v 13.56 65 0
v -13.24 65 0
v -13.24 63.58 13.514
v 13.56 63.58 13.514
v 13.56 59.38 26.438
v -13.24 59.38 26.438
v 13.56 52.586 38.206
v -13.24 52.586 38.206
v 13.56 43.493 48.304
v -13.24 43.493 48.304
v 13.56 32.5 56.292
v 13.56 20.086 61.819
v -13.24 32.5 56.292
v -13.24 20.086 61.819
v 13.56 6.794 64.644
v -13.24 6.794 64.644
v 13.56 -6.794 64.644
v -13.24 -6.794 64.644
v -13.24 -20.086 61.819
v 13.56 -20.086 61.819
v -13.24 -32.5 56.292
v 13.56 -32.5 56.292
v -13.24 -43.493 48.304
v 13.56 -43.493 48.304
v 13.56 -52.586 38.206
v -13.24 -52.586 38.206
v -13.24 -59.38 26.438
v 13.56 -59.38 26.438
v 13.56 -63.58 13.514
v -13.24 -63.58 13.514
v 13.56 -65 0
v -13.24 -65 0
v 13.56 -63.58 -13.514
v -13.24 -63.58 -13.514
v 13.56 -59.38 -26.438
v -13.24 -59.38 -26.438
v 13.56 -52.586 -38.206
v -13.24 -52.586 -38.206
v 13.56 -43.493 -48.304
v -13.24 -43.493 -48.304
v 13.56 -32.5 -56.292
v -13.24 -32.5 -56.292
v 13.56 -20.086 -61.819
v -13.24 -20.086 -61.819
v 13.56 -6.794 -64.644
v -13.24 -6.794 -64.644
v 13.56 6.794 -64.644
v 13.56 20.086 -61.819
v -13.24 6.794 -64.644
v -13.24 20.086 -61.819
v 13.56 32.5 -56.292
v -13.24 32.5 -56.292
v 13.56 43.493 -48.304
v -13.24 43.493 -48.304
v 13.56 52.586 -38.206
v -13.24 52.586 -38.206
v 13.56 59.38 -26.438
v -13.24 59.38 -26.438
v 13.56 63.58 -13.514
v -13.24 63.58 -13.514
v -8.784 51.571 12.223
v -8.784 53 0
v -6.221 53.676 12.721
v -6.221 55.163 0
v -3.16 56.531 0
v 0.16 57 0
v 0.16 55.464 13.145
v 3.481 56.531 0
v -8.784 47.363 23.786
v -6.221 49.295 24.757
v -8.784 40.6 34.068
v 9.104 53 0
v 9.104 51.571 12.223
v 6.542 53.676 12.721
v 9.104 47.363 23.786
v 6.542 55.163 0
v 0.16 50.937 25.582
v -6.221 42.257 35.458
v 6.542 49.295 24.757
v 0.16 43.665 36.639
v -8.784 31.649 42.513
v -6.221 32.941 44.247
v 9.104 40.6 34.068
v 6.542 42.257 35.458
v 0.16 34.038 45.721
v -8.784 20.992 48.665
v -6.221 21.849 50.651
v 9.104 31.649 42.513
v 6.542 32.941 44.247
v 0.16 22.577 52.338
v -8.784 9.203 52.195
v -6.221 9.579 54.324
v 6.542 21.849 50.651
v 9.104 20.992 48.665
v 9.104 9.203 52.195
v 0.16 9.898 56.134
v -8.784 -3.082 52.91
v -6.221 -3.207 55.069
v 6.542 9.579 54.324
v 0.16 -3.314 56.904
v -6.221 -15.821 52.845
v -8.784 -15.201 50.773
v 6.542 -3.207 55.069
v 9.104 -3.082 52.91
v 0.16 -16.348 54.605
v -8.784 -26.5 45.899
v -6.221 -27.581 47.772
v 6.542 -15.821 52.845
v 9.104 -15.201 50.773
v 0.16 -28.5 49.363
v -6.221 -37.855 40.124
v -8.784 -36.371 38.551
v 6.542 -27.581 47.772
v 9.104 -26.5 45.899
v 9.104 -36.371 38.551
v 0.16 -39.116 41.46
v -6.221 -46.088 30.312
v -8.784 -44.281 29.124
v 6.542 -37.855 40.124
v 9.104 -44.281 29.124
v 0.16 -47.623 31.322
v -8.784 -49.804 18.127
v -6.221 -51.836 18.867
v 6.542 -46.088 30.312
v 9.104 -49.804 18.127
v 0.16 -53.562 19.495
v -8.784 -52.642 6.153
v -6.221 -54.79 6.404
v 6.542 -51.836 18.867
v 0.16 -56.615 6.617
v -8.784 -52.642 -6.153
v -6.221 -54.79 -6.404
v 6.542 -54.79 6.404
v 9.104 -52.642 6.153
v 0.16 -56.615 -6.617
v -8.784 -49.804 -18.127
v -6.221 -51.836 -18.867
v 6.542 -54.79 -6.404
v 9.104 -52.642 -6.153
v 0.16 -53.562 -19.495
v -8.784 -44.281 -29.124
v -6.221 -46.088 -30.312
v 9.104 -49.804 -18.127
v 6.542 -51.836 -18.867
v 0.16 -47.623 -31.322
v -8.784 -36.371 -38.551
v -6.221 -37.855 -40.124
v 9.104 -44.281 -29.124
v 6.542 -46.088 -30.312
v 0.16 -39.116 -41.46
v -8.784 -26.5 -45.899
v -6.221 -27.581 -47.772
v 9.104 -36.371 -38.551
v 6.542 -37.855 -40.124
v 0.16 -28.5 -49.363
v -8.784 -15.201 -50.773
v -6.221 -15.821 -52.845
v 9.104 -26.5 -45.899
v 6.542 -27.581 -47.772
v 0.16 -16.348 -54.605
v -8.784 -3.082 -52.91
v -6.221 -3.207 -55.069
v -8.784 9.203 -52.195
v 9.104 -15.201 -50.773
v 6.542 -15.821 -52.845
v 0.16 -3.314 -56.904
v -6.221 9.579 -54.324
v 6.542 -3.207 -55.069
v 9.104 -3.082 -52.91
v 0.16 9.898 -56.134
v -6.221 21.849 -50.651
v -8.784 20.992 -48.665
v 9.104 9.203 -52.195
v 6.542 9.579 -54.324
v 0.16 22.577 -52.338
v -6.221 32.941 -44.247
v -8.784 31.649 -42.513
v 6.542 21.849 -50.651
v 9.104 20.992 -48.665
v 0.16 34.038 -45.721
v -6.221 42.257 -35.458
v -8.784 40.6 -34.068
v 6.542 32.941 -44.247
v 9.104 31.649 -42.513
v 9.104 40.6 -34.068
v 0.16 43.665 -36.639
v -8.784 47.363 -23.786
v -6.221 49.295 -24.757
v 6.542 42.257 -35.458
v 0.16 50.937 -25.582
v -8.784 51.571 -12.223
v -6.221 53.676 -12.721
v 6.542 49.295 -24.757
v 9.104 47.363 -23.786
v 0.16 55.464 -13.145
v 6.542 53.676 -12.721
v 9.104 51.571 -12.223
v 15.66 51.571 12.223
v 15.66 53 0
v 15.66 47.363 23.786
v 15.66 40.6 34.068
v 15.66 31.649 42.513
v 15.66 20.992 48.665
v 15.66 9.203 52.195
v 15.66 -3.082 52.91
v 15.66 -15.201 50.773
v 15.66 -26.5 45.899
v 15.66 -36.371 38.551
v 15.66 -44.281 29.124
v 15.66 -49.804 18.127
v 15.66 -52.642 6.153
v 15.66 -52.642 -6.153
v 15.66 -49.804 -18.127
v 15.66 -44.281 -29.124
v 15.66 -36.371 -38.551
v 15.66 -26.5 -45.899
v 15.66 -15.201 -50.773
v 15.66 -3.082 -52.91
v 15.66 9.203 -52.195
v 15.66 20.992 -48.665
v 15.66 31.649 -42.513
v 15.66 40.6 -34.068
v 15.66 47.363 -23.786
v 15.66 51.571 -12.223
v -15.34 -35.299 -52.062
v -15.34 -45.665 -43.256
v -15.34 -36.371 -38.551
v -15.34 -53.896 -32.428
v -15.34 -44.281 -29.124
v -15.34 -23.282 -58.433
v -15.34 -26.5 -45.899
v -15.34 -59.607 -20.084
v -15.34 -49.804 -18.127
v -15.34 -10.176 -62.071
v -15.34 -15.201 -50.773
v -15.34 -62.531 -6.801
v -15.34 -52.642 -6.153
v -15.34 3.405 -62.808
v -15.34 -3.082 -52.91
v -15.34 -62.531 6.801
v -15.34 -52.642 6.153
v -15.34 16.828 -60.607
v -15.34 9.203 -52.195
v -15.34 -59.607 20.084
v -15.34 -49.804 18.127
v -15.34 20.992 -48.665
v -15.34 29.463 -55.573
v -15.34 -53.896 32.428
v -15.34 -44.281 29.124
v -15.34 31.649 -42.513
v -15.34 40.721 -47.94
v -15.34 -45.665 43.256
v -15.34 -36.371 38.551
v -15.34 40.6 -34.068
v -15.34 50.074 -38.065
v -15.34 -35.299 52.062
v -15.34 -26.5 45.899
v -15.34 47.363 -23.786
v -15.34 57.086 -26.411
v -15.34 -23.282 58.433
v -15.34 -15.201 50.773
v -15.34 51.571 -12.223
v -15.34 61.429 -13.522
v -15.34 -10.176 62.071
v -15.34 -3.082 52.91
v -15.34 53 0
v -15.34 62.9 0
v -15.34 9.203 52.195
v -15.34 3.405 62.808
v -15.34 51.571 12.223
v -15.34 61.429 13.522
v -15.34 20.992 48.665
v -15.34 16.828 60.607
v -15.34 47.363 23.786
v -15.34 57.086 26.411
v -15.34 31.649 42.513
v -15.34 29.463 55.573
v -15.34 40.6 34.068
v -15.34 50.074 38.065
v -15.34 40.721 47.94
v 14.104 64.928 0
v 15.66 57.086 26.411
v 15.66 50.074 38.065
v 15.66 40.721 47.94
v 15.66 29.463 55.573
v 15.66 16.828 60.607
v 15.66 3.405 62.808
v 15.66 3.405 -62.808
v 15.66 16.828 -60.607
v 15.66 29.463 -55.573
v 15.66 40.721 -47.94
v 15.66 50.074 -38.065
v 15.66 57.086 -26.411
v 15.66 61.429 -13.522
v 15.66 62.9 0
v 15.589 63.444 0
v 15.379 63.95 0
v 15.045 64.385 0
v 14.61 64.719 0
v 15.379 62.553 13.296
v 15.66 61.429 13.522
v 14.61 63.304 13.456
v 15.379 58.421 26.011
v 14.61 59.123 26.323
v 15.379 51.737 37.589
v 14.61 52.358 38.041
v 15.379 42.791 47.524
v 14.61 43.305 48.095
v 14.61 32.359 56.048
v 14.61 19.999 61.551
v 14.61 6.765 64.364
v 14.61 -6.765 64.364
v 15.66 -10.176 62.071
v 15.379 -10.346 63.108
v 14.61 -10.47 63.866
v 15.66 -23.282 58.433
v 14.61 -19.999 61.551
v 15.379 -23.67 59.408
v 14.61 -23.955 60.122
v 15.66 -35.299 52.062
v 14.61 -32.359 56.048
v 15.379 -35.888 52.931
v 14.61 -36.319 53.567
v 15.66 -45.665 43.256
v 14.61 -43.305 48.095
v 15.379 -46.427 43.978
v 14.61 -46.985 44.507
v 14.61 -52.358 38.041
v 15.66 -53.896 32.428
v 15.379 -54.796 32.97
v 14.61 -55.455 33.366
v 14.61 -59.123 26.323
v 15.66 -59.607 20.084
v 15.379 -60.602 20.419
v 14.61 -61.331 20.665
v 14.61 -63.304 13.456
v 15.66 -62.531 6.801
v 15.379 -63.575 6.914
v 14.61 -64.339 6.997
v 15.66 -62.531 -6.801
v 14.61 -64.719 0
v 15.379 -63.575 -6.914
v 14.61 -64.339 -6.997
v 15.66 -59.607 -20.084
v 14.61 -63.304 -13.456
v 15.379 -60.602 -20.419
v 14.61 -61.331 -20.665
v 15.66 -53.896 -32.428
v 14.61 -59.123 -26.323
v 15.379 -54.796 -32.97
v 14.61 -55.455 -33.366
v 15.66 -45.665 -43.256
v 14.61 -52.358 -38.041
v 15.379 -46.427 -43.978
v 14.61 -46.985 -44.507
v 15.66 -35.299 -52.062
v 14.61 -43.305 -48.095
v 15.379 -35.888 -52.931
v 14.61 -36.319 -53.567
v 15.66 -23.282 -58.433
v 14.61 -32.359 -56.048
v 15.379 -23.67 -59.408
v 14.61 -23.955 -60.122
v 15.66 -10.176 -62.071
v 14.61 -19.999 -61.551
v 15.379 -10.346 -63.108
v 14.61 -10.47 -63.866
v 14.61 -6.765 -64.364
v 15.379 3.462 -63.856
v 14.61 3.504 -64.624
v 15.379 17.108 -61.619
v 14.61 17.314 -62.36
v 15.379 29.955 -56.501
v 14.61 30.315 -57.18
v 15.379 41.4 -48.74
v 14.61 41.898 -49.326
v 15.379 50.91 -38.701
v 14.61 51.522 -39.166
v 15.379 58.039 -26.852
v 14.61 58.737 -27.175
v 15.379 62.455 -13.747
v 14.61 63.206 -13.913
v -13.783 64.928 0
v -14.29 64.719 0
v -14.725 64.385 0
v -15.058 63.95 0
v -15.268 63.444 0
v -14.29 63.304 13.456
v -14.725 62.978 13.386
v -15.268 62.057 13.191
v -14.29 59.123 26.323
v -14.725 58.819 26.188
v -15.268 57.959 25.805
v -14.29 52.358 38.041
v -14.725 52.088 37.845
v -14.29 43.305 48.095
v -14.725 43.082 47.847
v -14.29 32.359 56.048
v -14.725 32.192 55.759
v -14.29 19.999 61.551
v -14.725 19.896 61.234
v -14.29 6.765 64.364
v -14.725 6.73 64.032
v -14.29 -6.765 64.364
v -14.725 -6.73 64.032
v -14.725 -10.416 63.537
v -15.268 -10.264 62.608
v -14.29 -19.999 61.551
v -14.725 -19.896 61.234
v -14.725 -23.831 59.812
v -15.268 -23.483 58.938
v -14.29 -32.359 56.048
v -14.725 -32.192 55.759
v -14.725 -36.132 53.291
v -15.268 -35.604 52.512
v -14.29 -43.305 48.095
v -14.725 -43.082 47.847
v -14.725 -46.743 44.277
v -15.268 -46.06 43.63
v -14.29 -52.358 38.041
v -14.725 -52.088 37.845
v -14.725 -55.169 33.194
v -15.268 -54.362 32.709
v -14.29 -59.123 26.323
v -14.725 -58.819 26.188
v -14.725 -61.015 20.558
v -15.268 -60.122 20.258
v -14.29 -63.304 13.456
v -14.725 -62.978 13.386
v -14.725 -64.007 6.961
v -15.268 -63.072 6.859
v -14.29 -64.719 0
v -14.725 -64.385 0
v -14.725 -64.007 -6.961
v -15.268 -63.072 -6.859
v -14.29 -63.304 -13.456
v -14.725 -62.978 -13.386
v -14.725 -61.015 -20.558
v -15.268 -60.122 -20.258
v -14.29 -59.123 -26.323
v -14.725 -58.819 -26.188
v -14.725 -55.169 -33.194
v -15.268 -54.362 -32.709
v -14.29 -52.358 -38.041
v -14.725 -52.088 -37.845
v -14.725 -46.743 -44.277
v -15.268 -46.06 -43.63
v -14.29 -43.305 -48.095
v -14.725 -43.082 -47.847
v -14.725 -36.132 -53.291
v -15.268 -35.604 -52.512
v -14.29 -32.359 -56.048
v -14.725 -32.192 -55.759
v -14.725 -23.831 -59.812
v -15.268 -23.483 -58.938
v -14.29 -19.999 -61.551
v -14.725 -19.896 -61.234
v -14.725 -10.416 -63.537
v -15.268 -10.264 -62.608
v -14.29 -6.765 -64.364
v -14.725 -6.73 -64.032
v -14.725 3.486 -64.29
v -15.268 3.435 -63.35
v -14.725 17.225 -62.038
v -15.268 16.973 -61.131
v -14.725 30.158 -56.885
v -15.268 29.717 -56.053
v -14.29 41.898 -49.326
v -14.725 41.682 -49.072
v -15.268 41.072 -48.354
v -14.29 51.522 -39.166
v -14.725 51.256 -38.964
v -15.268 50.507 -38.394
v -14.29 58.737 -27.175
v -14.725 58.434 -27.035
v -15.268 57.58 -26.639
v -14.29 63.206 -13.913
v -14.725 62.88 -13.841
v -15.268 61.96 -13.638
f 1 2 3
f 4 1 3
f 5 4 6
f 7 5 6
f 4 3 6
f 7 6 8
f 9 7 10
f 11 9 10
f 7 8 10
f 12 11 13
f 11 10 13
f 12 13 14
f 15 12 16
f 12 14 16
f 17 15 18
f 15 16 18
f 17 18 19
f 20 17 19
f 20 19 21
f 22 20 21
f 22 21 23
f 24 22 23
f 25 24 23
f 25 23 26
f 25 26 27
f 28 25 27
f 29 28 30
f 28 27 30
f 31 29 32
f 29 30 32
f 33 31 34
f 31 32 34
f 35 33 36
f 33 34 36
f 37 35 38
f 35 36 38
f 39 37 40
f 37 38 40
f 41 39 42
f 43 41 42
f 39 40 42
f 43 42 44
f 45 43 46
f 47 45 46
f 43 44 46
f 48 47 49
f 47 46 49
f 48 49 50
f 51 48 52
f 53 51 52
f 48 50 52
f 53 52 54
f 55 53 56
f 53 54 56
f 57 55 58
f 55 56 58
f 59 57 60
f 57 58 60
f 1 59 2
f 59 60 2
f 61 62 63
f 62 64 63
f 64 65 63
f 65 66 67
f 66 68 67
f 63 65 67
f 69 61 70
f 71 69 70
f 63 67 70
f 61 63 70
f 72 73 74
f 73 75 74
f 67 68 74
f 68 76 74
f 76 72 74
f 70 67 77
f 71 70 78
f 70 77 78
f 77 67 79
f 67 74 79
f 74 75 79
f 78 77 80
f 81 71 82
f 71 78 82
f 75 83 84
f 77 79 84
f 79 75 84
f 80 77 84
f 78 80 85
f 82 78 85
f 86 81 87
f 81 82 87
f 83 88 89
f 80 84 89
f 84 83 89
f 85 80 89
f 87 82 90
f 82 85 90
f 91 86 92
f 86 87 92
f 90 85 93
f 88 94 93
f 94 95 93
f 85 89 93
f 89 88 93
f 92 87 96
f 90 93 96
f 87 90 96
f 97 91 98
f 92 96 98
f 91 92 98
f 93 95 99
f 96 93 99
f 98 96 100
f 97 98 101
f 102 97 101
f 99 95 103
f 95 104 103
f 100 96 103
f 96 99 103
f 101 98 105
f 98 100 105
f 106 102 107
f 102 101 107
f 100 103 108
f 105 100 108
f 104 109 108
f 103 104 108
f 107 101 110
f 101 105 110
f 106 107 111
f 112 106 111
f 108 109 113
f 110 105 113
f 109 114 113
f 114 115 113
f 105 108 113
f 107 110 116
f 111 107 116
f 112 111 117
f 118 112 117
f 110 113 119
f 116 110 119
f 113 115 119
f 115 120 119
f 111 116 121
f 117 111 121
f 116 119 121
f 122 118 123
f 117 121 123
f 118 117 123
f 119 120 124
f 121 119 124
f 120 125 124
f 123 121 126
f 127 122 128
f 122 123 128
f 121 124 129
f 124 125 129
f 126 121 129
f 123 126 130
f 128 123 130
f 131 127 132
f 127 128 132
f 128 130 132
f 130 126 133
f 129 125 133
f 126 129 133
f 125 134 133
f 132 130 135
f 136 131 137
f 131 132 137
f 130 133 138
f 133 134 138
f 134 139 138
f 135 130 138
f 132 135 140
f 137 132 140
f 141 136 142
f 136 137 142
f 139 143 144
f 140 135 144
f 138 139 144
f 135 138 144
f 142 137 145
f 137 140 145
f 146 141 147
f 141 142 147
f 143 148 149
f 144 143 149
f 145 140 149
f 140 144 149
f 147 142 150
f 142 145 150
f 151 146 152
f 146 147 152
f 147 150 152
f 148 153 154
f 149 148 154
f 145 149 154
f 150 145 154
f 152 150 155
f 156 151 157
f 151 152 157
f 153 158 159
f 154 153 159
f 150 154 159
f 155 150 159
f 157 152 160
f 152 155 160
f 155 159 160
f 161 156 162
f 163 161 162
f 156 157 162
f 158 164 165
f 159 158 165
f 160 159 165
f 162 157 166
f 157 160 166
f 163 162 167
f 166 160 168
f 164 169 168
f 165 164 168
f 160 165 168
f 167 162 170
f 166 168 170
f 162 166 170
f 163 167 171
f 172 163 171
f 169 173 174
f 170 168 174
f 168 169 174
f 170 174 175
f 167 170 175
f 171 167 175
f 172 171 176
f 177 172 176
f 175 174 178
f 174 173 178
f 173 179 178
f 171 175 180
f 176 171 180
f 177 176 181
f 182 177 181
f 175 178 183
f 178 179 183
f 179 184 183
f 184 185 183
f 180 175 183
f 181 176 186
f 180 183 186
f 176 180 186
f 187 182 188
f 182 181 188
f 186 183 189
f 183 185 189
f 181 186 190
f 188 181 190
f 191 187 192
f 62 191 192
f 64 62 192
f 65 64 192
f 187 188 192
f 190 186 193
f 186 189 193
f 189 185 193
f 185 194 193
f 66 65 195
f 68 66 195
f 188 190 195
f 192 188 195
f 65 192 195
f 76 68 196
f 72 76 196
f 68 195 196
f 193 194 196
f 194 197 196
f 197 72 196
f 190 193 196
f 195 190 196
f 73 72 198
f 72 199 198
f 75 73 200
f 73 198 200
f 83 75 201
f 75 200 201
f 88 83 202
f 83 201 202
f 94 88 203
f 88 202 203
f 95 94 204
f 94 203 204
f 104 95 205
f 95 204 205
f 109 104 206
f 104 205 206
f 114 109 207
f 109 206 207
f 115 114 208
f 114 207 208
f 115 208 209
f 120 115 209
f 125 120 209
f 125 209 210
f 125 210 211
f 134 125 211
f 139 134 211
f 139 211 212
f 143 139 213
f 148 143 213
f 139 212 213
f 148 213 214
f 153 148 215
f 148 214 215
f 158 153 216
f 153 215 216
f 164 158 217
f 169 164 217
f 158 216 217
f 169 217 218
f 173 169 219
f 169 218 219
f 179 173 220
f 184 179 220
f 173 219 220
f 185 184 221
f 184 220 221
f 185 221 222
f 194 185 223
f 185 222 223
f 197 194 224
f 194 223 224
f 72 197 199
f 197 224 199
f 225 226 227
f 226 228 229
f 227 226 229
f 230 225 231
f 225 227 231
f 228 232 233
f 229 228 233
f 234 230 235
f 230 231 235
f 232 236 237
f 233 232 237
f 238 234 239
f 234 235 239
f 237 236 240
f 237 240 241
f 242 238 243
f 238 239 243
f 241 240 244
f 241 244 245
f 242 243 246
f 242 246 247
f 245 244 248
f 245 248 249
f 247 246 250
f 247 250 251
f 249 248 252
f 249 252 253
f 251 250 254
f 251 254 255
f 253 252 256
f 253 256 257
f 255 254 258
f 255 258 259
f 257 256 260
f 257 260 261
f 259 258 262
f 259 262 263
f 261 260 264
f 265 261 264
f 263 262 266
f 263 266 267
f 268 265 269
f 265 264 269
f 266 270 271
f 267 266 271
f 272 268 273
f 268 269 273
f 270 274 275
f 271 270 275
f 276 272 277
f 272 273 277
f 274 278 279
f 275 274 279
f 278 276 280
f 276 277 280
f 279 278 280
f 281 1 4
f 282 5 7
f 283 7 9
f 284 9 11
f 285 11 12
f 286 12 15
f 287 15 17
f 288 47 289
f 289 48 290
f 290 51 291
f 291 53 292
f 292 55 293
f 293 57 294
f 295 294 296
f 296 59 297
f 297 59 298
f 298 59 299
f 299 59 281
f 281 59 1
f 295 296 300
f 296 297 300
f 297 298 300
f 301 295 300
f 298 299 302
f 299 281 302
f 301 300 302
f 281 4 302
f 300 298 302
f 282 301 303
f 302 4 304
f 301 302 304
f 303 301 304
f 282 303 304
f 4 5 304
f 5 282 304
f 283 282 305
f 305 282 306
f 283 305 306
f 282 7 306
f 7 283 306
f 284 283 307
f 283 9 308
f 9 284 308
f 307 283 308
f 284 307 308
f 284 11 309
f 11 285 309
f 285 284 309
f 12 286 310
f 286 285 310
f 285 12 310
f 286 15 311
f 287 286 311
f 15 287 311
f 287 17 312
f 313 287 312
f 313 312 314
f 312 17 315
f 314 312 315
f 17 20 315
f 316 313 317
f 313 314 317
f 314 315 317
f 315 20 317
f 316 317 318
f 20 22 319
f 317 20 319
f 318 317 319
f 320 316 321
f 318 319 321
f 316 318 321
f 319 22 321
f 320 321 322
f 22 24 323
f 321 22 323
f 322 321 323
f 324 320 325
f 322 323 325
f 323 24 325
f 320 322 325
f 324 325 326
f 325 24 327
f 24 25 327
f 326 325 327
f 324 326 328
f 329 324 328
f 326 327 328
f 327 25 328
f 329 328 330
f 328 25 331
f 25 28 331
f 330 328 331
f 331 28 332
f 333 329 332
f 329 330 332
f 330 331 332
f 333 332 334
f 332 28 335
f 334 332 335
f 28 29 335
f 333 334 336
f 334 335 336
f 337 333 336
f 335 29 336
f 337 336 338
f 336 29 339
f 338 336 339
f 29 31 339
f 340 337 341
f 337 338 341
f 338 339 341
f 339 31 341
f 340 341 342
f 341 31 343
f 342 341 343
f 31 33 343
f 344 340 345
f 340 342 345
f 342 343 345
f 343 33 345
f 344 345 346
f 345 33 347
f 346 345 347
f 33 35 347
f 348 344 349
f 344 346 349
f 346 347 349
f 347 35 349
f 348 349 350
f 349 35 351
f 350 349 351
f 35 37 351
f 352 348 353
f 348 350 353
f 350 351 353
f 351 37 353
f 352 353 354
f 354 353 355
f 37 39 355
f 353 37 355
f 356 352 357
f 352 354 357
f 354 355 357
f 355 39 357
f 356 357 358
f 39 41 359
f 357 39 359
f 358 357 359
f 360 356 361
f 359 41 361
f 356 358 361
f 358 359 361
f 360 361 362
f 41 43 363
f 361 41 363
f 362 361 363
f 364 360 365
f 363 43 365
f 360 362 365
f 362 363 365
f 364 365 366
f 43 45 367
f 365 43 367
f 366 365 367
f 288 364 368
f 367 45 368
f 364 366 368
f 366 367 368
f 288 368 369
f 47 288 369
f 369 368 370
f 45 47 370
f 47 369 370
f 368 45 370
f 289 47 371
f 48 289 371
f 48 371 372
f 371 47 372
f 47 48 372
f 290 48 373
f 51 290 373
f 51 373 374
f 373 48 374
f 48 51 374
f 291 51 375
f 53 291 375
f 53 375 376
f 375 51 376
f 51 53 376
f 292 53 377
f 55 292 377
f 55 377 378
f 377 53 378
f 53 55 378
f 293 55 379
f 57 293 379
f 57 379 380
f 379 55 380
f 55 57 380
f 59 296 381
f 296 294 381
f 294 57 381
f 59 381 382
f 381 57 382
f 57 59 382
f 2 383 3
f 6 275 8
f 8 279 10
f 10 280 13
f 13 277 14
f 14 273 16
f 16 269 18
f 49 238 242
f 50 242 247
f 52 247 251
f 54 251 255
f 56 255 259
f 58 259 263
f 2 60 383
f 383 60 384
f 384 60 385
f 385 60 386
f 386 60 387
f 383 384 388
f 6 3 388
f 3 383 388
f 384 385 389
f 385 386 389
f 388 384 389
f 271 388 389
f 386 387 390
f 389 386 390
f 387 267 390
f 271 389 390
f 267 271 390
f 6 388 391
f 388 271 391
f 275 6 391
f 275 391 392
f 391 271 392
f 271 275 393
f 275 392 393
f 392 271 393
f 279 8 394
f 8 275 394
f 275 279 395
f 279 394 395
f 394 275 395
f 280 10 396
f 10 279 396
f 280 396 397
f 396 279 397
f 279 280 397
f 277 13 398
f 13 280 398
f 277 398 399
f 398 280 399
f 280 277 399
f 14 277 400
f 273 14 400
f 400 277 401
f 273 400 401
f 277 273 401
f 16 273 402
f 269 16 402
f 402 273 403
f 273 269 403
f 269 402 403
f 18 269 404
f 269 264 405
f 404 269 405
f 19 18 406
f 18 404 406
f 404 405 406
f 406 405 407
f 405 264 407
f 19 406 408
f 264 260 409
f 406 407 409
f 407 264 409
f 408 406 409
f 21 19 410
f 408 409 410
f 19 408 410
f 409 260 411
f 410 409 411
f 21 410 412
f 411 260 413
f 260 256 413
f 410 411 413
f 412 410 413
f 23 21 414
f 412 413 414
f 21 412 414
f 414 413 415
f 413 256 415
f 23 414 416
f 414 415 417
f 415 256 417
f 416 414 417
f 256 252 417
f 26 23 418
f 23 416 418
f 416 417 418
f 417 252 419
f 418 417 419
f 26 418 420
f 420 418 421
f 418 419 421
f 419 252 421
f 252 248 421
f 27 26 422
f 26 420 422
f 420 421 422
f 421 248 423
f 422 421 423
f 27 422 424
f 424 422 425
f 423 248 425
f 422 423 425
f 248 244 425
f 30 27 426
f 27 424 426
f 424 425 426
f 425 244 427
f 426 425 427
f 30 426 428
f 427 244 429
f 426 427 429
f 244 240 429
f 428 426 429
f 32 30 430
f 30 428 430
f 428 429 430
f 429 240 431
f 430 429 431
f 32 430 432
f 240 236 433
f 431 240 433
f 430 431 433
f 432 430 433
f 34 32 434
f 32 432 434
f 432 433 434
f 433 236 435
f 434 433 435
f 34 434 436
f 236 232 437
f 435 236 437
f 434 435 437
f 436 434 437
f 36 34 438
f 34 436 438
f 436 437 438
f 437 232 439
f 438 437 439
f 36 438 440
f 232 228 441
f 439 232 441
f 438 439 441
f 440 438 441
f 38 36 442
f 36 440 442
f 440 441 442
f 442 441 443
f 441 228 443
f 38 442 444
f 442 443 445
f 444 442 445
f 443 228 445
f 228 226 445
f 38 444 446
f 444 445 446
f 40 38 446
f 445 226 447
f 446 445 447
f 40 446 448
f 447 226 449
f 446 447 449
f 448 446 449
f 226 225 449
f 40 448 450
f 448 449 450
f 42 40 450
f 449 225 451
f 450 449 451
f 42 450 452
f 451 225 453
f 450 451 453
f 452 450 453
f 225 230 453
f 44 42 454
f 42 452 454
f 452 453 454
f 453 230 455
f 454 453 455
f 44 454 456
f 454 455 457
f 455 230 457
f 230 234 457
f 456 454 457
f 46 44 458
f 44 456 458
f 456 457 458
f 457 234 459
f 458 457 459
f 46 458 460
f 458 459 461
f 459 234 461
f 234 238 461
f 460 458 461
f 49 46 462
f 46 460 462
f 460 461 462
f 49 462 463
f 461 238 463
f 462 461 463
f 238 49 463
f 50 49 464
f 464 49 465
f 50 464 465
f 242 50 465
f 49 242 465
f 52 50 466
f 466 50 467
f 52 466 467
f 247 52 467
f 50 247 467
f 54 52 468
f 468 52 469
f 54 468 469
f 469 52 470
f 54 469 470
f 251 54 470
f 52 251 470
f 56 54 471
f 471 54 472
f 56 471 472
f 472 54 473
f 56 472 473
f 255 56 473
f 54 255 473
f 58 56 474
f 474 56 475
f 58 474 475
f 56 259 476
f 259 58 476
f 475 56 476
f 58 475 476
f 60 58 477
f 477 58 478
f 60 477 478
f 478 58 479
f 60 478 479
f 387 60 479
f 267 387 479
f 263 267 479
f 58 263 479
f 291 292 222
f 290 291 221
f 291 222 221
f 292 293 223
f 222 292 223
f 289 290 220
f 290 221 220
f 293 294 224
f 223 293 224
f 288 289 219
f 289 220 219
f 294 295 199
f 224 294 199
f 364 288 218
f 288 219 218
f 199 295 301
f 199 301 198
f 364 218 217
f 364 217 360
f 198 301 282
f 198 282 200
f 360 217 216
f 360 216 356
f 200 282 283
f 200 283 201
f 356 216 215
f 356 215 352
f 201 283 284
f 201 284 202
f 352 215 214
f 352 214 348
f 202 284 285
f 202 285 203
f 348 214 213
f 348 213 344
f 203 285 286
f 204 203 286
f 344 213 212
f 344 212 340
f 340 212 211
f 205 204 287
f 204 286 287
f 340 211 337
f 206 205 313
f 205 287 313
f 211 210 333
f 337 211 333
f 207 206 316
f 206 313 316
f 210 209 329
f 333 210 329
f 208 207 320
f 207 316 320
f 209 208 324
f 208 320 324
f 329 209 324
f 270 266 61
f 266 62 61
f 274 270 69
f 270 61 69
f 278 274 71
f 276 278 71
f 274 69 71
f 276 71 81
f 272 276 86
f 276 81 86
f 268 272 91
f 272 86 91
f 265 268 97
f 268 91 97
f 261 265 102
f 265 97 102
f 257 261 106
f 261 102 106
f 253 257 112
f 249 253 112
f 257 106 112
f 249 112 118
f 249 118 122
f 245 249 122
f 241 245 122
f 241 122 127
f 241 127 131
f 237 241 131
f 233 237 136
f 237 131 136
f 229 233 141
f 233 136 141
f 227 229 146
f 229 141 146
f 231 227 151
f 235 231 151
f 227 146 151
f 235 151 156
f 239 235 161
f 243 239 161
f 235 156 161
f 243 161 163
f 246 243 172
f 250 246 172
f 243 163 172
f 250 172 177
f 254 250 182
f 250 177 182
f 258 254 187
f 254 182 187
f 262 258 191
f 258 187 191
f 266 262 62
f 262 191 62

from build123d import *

# Parameters (mm, degrees)
FILLET1_R = 2.1


with BuildPart() as part:
    # Sketch3 → Revolve1 (revolve)
    with BuildSketch(Plane.XY):
        with BuildLine():
            Line((-15.339778092, 53), (-8.784050002, 53))
            ThreePointArc((-8.784050002, 53), (0.160221908, 57), (9.104493818, 53))
            Line((9.104493818, 53), (15.660221908, 53))
            Line((15.660221908, 53), (15.660221908, 65))
            Line((15.660221908, 65), (-15.339778092, 65))
            Line((-15.339778092, 65), (-15.339778092, 53))
        make_face()
    revolve(axis=Axis((-16.039993209, 0, 0), (1, 0, 0)))

    # Fillet1
    fillet1_edges = [part.edges().sort_by_distance(p)[0] for p in [
        (15.660221908, -65, 0),
        (-15.339778092, -65, 0),
    ]]
    fillet(fillet1_edges, radius=FILLET1_R)


solid = part.part
